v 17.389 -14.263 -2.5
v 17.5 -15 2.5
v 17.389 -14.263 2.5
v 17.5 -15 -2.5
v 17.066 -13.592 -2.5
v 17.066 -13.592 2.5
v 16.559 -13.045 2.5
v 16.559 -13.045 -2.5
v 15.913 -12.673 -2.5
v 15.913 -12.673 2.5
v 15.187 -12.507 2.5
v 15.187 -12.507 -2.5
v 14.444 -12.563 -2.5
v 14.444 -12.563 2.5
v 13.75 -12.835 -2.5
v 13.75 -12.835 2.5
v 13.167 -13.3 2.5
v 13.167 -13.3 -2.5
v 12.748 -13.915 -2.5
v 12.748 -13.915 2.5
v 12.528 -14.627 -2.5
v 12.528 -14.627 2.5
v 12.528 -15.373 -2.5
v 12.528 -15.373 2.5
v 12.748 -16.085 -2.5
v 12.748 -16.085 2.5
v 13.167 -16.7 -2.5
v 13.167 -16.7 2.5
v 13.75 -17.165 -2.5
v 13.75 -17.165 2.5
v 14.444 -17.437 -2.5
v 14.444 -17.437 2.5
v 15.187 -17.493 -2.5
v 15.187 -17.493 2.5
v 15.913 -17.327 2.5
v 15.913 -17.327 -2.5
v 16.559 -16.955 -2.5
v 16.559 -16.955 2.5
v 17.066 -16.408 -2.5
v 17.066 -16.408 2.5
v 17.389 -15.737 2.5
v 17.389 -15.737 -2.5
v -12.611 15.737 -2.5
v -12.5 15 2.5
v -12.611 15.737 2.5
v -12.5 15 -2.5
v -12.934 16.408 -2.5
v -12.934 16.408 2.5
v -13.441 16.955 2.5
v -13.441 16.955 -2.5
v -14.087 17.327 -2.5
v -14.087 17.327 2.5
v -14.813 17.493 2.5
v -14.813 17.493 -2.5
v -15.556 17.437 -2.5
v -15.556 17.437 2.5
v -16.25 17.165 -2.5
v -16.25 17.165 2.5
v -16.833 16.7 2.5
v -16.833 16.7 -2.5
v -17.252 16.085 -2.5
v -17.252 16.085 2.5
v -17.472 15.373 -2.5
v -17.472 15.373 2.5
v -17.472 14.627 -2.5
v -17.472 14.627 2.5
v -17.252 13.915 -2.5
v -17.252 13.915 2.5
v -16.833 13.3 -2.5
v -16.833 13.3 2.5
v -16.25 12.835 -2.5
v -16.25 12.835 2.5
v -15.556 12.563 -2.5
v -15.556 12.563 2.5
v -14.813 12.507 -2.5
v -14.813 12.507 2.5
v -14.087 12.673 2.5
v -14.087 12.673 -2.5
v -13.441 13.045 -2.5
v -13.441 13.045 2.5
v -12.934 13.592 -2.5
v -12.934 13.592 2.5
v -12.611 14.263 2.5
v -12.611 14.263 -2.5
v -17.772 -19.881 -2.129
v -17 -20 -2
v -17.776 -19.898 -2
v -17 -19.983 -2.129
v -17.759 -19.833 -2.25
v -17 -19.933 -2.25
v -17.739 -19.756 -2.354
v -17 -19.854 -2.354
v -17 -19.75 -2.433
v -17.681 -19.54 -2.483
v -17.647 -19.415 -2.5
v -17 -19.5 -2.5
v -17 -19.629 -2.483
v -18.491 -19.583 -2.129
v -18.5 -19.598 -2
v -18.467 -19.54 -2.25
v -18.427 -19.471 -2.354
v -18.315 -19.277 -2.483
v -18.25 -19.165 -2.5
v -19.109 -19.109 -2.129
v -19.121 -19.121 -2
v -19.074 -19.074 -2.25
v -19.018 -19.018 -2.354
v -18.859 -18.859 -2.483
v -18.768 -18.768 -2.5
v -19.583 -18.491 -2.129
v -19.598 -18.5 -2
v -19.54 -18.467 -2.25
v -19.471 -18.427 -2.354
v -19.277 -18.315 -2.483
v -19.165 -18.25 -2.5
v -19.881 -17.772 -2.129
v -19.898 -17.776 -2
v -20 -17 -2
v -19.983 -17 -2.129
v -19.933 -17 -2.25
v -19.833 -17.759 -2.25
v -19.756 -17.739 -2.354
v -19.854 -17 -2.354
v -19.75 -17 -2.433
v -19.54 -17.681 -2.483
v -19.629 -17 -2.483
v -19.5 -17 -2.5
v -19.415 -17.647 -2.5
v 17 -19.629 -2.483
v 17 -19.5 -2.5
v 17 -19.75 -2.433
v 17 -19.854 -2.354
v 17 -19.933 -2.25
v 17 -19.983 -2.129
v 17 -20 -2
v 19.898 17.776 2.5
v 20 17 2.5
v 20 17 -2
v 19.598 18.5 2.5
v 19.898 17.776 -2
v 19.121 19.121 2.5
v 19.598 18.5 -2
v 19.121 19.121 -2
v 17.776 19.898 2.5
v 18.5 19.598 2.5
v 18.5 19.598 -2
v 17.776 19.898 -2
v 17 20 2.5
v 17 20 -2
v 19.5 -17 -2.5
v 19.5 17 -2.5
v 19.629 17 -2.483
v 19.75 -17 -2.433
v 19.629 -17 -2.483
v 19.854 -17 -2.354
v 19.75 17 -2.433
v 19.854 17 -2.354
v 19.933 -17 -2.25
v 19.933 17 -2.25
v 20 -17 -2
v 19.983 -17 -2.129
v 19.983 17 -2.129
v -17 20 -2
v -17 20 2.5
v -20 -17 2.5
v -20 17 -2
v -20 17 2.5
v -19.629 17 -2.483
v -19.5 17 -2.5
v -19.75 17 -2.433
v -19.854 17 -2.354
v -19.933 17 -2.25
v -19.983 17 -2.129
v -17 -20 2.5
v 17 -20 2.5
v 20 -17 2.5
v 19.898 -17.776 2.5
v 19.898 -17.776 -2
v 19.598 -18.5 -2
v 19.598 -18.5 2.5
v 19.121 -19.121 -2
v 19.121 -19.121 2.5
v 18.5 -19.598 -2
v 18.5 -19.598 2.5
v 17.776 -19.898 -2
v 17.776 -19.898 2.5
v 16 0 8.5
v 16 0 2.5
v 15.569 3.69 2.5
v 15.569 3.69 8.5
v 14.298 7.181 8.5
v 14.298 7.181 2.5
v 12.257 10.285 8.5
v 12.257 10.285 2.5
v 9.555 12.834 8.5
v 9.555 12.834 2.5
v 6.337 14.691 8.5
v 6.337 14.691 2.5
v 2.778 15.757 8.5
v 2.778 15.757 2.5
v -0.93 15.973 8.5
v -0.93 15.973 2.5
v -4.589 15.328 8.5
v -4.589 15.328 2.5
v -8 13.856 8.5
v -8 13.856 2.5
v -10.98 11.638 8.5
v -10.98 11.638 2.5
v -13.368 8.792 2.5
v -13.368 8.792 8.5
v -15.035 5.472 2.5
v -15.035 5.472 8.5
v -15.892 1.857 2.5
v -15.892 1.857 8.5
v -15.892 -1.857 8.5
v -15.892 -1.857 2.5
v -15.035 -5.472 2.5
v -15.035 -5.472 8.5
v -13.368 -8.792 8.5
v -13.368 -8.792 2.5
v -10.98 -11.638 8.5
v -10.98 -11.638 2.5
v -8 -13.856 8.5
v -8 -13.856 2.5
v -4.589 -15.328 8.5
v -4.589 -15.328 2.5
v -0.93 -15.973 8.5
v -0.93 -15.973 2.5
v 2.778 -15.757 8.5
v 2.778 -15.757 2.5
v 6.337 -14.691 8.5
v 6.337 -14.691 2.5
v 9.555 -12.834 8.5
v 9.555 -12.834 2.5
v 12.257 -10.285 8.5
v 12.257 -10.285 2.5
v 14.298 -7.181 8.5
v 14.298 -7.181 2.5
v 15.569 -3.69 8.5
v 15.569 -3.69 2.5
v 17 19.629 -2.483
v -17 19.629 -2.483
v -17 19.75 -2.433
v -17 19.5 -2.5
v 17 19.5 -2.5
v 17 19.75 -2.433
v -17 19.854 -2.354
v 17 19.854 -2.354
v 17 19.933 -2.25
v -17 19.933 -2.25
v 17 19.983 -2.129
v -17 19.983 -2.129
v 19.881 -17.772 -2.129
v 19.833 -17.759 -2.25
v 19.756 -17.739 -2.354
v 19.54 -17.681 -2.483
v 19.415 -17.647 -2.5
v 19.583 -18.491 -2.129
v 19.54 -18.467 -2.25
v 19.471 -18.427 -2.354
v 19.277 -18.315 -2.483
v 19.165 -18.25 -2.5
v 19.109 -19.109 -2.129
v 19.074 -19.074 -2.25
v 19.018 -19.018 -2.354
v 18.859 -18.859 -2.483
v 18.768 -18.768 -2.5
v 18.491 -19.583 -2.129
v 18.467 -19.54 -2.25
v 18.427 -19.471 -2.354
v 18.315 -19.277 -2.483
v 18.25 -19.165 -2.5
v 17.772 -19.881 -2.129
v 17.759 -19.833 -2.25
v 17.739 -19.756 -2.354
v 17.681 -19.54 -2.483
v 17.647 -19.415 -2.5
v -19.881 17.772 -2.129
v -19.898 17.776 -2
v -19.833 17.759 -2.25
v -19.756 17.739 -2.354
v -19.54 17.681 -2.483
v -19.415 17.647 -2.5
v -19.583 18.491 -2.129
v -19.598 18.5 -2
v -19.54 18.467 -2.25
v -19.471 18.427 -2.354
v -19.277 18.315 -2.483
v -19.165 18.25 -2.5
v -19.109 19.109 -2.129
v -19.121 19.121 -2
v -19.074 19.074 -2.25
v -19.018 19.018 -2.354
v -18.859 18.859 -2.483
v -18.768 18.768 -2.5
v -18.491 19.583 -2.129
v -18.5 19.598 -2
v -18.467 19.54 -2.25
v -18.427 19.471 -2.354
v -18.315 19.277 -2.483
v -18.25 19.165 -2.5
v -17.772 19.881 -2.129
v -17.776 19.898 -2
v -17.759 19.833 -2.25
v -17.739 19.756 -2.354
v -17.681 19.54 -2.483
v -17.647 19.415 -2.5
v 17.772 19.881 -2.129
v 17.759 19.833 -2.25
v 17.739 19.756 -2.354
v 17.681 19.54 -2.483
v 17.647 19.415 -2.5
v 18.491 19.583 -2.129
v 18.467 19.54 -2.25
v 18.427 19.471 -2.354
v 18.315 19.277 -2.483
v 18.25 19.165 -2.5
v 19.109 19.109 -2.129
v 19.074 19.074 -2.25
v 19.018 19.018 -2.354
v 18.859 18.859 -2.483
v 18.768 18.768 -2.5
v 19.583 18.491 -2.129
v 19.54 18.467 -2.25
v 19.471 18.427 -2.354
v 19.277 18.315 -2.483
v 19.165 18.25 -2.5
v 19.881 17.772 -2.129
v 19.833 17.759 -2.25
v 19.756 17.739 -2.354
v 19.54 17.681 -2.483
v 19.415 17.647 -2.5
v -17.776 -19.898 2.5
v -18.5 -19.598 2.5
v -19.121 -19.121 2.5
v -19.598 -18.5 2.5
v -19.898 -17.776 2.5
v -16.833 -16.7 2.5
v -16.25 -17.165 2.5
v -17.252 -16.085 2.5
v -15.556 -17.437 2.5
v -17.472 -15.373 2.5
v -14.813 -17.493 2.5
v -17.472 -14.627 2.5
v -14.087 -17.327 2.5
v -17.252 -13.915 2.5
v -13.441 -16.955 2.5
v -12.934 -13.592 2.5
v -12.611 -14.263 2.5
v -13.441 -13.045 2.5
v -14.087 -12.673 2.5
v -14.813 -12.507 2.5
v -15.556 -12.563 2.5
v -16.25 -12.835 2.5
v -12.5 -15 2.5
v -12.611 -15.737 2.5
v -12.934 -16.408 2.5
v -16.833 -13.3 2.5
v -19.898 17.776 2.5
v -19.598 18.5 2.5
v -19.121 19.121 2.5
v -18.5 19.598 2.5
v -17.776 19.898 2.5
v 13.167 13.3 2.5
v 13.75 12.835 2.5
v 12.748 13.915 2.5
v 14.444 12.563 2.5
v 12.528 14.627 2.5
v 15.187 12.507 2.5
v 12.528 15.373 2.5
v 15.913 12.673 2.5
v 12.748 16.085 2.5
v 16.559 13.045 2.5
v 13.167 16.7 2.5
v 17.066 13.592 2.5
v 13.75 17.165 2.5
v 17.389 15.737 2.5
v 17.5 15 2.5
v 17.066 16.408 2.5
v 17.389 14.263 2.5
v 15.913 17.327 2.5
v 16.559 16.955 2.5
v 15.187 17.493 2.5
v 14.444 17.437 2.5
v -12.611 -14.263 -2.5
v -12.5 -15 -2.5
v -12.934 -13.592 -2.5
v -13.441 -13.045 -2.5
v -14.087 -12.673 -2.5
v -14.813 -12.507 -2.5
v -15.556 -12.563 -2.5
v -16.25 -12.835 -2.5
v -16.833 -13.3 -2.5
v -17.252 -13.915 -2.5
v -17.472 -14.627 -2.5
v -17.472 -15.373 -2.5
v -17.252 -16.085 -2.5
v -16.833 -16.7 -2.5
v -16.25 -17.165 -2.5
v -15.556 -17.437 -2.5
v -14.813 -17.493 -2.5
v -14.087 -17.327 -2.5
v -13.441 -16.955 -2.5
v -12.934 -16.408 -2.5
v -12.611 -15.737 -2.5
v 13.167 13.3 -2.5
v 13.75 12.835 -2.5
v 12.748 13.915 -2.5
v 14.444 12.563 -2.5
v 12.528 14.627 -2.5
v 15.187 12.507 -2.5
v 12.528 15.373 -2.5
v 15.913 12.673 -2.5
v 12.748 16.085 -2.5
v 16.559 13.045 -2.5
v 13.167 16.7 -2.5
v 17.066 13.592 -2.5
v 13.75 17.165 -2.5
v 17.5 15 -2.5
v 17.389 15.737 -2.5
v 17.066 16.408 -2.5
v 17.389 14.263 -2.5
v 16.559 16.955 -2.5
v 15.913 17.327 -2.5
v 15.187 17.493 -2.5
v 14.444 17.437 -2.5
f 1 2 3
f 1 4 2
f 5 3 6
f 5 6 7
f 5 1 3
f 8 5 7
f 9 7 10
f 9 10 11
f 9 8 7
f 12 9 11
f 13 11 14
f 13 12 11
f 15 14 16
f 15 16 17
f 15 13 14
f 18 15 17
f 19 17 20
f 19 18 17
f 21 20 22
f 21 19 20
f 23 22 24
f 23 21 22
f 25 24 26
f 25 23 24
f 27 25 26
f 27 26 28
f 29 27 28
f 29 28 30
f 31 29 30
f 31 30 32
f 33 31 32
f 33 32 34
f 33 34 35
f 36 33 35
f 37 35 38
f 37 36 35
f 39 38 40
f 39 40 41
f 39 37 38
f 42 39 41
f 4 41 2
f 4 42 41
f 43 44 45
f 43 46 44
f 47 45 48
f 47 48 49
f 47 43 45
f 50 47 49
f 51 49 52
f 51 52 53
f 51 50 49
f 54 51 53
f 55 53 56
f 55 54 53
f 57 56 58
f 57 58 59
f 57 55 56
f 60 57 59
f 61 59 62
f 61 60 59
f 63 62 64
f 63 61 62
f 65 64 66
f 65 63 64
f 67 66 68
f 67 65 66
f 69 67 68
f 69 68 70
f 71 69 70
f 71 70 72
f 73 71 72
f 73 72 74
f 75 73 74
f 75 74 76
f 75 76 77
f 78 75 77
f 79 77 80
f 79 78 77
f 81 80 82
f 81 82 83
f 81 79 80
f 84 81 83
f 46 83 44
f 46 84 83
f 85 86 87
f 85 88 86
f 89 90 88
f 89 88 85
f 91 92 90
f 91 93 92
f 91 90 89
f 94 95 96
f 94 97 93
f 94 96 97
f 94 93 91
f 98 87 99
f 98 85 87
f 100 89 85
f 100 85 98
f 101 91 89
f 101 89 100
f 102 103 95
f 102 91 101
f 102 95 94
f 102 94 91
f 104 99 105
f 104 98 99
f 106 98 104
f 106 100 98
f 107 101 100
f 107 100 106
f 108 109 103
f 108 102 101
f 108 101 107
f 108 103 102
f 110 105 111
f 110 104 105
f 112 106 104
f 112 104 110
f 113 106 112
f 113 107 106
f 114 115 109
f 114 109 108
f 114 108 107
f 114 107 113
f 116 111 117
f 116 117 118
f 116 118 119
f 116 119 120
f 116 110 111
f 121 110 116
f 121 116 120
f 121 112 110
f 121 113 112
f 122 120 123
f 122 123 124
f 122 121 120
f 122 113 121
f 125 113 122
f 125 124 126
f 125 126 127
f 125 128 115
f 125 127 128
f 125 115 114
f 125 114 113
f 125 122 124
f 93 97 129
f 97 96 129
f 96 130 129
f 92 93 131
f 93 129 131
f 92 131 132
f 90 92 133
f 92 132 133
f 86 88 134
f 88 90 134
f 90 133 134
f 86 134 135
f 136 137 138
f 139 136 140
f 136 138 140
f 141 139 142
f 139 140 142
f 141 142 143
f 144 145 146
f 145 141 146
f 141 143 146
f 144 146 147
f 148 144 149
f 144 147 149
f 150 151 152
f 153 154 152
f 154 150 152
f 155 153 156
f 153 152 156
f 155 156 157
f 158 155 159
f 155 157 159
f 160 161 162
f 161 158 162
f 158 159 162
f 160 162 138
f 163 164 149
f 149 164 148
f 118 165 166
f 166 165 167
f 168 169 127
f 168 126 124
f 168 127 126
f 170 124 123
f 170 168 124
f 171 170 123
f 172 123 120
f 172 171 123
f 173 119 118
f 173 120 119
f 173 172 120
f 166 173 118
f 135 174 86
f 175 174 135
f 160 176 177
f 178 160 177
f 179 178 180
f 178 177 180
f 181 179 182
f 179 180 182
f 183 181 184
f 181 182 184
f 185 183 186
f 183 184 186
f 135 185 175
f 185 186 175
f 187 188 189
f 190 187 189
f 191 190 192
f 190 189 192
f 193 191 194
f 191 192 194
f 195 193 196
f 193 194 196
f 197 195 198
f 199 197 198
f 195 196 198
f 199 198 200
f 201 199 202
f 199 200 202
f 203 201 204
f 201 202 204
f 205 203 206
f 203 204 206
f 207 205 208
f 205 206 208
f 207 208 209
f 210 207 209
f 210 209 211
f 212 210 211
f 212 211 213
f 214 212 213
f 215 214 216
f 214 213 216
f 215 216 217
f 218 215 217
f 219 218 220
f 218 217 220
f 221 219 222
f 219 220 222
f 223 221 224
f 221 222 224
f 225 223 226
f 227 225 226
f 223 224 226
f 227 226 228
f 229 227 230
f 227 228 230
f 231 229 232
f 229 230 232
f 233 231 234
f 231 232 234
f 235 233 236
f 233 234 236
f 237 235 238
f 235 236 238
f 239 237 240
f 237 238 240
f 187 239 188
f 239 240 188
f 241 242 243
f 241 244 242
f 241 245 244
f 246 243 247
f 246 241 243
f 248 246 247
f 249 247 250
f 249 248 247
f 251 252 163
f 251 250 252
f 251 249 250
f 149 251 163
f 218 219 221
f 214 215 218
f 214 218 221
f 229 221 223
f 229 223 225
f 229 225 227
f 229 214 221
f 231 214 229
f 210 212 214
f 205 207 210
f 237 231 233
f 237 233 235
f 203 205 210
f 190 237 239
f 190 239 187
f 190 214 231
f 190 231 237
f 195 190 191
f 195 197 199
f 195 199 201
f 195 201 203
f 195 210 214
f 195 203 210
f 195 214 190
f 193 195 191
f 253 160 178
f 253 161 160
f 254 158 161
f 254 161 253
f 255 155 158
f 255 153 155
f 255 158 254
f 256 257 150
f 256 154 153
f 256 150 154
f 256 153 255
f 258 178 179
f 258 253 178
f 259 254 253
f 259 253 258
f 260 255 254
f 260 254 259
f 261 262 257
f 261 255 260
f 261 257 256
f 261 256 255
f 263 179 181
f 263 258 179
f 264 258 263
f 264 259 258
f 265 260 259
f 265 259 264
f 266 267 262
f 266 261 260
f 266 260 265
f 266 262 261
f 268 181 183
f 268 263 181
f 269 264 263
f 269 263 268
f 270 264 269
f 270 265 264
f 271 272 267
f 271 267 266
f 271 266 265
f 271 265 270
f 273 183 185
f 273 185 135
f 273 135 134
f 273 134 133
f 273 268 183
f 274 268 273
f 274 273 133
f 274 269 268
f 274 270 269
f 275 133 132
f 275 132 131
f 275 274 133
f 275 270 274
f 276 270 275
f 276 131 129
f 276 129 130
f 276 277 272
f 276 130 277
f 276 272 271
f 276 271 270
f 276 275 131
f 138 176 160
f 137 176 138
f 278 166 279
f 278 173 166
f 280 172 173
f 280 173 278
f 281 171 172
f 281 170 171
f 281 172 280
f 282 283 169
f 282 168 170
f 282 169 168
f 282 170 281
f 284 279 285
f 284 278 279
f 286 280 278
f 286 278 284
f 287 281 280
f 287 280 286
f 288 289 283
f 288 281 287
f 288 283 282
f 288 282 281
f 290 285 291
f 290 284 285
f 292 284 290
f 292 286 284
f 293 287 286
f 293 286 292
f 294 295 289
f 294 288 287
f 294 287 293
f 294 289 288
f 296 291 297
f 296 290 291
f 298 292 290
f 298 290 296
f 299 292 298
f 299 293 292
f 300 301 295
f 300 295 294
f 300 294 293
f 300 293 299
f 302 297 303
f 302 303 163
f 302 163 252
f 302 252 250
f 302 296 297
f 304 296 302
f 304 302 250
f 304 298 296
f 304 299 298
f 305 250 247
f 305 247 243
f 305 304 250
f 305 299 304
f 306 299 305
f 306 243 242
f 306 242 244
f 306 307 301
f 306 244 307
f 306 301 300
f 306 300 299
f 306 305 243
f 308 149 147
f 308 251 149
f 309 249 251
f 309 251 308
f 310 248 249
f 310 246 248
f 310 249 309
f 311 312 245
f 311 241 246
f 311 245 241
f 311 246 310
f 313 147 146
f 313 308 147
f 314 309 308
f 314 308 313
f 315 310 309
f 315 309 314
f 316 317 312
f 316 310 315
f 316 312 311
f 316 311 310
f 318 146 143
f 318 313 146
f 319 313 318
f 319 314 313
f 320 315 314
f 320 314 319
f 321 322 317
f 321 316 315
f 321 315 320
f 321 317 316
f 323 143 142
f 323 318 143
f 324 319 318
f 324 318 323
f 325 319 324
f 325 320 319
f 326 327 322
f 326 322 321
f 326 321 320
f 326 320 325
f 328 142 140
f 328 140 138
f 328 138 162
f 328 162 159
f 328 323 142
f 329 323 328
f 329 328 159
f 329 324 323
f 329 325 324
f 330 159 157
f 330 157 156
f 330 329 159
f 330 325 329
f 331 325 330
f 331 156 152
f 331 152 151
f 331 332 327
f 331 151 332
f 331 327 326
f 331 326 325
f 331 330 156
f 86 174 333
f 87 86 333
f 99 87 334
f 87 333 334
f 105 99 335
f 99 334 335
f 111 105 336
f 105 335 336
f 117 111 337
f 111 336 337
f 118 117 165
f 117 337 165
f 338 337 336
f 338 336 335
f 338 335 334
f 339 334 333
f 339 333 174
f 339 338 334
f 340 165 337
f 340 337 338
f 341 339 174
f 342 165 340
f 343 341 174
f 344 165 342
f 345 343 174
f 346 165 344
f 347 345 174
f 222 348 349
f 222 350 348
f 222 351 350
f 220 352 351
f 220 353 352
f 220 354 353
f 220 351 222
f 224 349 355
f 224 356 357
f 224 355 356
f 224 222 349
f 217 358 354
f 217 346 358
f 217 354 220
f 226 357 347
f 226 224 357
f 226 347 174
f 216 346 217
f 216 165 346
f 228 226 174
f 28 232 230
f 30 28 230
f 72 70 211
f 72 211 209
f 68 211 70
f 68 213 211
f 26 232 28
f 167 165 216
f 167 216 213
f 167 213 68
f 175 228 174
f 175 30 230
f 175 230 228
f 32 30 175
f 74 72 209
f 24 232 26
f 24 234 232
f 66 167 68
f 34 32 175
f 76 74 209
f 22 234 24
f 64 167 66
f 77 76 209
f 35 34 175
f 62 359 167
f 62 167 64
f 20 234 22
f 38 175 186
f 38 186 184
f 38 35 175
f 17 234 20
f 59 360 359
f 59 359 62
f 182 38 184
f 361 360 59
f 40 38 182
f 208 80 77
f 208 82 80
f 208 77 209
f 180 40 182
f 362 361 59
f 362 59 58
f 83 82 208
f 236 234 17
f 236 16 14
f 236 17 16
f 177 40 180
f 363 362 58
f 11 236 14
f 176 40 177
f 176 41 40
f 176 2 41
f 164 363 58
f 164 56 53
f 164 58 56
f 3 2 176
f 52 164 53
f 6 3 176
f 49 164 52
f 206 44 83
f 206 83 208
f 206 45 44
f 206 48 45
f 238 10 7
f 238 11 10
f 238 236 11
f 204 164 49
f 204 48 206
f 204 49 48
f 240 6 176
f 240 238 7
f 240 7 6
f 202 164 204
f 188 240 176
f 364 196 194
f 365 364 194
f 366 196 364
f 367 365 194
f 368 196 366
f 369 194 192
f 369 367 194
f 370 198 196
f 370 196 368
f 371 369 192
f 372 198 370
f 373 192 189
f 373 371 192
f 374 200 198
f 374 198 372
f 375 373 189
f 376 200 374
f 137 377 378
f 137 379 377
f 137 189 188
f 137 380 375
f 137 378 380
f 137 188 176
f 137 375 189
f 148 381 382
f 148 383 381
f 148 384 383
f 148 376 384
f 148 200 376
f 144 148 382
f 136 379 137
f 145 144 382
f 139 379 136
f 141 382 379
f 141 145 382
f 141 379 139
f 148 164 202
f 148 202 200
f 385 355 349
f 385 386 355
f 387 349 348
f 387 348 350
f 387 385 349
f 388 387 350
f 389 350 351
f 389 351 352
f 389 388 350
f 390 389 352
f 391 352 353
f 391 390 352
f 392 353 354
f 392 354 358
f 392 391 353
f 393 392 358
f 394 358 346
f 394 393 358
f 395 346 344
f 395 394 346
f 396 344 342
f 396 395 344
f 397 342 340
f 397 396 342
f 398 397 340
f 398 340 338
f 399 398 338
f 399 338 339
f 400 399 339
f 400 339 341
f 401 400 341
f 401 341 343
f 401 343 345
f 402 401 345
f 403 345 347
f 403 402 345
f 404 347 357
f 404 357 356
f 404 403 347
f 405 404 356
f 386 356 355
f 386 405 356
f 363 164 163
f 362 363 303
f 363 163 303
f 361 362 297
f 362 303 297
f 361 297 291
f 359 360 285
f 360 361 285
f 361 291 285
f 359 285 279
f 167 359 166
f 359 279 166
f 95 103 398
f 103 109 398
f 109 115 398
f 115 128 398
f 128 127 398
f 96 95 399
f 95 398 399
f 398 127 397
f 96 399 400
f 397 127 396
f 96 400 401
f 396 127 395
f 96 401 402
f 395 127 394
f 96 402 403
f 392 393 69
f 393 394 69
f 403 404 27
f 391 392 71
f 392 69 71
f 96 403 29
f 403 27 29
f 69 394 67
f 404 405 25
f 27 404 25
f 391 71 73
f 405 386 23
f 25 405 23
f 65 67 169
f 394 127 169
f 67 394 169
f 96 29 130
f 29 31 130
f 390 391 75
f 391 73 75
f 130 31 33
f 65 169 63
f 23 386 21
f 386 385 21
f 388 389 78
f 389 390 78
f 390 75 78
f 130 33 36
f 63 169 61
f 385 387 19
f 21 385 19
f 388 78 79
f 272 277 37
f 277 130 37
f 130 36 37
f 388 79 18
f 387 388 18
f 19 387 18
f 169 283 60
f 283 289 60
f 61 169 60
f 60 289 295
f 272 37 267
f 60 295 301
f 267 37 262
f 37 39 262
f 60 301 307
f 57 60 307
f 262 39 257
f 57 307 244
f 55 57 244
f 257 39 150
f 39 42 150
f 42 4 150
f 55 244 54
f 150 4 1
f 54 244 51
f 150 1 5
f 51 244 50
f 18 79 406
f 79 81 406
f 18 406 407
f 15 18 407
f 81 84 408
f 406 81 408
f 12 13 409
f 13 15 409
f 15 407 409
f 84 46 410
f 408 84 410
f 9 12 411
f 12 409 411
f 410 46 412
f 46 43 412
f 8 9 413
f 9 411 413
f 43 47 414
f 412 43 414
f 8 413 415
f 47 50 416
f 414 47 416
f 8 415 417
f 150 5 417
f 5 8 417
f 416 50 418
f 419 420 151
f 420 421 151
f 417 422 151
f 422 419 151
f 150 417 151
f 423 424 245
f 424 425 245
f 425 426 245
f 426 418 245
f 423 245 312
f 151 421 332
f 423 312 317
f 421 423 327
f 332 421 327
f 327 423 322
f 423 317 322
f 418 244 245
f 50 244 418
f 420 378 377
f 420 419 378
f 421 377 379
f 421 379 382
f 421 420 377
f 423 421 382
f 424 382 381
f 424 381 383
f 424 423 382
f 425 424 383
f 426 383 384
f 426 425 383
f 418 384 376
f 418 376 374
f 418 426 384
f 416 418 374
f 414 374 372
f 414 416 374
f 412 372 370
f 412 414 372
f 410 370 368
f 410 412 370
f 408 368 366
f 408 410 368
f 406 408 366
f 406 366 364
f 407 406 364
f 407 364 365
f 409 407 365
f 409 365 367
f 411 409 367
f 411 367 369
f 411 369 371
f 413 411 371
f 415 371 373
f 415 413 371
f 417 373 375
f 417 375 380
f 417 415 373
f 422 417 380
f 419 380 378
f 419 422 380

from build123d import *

# Parameters (mm, degrees)
SKETCH1_W           = 40
SKETCH1_H           = 40
SKETCH1_R           = 2.5
SKETCH1_R_2         = 16
BOSS_EXTRUDE1_DEPTH = 2.5
BOSS_EXTRUDE2_START = 2.5
SKETCH1_5_R         = 16
BOSS_EXTRUDE2_DEPTH = 6
FILLET1_R           = 0.5
FILLET2_R           = 3


with BuildPart() as part:
    # Sketch1 → Boss-Extrude1 (new, symmetric)
    # profile 1 of 2: a face of its own
    with BuildSketch(Plane.XY):
        Rectangle(SKETCH1_W, SKETCH1_H)
        with Locations((-15, -15)):
            Circle(SKETCH1_R, mode=Mode.SUBTRACT)
        with Locations((15, -15)):
            Circle(SKETCH1_R, mode=Mode.SUBTRACT)
        with Locations((15, 15)):
            Circle(SKETCH1_R, mode=Mode.SUBTRACT)
        with Locations((-15, 15)):
            Circle(SKETCH1_R, mode=Mode.SUBTRACT)
        Circle(SKETCH1_R_2, mode=Mode.SUBTRACT)
    # profile 2 of 2: a face of its own
    with BuildSketch(Plane.XY):
        Circle(SKETCH1_R_2)
    extrude(amount=BOSS_EXTRUDE1_DEPTH, both=True)

    # Sketch1<5> → Boss-Extrude2 (add)
    with BuildSketch(Plane.XY.offset(BOSS_EXTRUDE2_START)):
        Circle(SKETCH1_5_R)
    extrude(amount=BOSS_EXTRUDE2_DEPTH)

    # Fillet1
    fillet1_edges = [part.edges().sort_by_distance(p)[0] for p in [
        (0, -20, -2.5),
        (-20, 0, -2.5),
        (0, 20, -2.5),
        (20, 0, -2.5),
    ]]
    fillet(fillet1_edges, radius=FILLET1_R)

    # Fillet2
    # the kernel refuses this fillet: 3 mm, written as the material it takes off along each edge
    with BuildSketch(Plane(origin=(-17, 17, -2.5), x_dir=(-1, 0, 0), z_dir=(0, -1, 0))) as fillet2_piece_1:
        with BuildLine():
            CenterArc((2.5, -0.5), 0.5, 0, 90)
            Line((3, -0.5), (3, 0))
            Line((3, 0), (2.5, 0))
        make_face()
    revolve(axis=Axis((-17, 17, -2.5), (0, 0, -1)), revolution_arc=90, mode=Mode.SUBTRACT)
    with BuildSketch(Plane(origin=(-17, -17, -2.5), x_dir=(0, -1, 0), z_dir=(1, 0, 0))) as fillet2_piece_2:
        with BuildLine():
            CenterArc((2.5, -0.5), 0.5, 0, 90)
            Line((3, -0.5), (3, 0))
            Line((3, 0), (2.5, 0))
        make_face()
    revolve(axis=Axis((-17, -17, -2.5), (0, 0, -1)), revolution_arc=90, mode=Mode.SUBTRACT)
    with BuildSketch(Plane(origin=(17, 17, -2.5), x_dir=(0, 1, 0), z_dir=(-1, 0, 0))) as fillet2_piece_3:
        with BuildLine():
            CenterArc((2.5, -0.5), 0.5, 0, 90)
            Line((3, -0.5), (3, 0))
            Line((3, 0), (2.5, 0))
        make_face()
    revolve(axis=Axis((17, 17, -2.5), (0, 0, -1)), revolution_arc=90, mode=Mode.SUBTRACT)
    with BuildSketch(Plane(origin=(17, -17, -2.5), x_dir=(1, 0, 0), z_dir=(0, 1, 0))) as fillet2_piece_4:
        with BuildLine():
            CenterArc((2.5, -0.5), 0.5, 0, 90)
            Line((3, -0.5), (3, 0))
            Line((3, 0), (2.5, 0))
        make_face()
    revolve(axis=Axis((17, -17, -2.5), (0, 0, -1)), revolution_arc=90, mode=Mode.SUBTRACT)
    with BuildSketch(Plane(origin=(20, -20, 10), x_dir=(0, 1, 0), z_dir=(0, 0, -1)), Plane(origin=(-20, -20, 10), x_dir=(1, 0, 0), z_dir=(0, 0, -1)), Plane(origin=(-20, 20, -2.5), x_dir=(1, 0, 0), z_dir=(0, 0, 1)), Plane(origin=(20, 20, -2.5), x_dir=(0, -1, 0), z_dir=(0, 0, 1))) as fillet2_piece_5:
        with BuildLine():
            CenterArc((FILLET2_R, -FILLET2_R), FILLET2_R, 90, 90)
            Line((0, -FILLET2_R), (0, 0))
            Line((0, 0), (FILLET2_R, 0))
        make_face()
    extrude(amount=12.5, mode=Mode.SUBTRACT)


solid = part.part
